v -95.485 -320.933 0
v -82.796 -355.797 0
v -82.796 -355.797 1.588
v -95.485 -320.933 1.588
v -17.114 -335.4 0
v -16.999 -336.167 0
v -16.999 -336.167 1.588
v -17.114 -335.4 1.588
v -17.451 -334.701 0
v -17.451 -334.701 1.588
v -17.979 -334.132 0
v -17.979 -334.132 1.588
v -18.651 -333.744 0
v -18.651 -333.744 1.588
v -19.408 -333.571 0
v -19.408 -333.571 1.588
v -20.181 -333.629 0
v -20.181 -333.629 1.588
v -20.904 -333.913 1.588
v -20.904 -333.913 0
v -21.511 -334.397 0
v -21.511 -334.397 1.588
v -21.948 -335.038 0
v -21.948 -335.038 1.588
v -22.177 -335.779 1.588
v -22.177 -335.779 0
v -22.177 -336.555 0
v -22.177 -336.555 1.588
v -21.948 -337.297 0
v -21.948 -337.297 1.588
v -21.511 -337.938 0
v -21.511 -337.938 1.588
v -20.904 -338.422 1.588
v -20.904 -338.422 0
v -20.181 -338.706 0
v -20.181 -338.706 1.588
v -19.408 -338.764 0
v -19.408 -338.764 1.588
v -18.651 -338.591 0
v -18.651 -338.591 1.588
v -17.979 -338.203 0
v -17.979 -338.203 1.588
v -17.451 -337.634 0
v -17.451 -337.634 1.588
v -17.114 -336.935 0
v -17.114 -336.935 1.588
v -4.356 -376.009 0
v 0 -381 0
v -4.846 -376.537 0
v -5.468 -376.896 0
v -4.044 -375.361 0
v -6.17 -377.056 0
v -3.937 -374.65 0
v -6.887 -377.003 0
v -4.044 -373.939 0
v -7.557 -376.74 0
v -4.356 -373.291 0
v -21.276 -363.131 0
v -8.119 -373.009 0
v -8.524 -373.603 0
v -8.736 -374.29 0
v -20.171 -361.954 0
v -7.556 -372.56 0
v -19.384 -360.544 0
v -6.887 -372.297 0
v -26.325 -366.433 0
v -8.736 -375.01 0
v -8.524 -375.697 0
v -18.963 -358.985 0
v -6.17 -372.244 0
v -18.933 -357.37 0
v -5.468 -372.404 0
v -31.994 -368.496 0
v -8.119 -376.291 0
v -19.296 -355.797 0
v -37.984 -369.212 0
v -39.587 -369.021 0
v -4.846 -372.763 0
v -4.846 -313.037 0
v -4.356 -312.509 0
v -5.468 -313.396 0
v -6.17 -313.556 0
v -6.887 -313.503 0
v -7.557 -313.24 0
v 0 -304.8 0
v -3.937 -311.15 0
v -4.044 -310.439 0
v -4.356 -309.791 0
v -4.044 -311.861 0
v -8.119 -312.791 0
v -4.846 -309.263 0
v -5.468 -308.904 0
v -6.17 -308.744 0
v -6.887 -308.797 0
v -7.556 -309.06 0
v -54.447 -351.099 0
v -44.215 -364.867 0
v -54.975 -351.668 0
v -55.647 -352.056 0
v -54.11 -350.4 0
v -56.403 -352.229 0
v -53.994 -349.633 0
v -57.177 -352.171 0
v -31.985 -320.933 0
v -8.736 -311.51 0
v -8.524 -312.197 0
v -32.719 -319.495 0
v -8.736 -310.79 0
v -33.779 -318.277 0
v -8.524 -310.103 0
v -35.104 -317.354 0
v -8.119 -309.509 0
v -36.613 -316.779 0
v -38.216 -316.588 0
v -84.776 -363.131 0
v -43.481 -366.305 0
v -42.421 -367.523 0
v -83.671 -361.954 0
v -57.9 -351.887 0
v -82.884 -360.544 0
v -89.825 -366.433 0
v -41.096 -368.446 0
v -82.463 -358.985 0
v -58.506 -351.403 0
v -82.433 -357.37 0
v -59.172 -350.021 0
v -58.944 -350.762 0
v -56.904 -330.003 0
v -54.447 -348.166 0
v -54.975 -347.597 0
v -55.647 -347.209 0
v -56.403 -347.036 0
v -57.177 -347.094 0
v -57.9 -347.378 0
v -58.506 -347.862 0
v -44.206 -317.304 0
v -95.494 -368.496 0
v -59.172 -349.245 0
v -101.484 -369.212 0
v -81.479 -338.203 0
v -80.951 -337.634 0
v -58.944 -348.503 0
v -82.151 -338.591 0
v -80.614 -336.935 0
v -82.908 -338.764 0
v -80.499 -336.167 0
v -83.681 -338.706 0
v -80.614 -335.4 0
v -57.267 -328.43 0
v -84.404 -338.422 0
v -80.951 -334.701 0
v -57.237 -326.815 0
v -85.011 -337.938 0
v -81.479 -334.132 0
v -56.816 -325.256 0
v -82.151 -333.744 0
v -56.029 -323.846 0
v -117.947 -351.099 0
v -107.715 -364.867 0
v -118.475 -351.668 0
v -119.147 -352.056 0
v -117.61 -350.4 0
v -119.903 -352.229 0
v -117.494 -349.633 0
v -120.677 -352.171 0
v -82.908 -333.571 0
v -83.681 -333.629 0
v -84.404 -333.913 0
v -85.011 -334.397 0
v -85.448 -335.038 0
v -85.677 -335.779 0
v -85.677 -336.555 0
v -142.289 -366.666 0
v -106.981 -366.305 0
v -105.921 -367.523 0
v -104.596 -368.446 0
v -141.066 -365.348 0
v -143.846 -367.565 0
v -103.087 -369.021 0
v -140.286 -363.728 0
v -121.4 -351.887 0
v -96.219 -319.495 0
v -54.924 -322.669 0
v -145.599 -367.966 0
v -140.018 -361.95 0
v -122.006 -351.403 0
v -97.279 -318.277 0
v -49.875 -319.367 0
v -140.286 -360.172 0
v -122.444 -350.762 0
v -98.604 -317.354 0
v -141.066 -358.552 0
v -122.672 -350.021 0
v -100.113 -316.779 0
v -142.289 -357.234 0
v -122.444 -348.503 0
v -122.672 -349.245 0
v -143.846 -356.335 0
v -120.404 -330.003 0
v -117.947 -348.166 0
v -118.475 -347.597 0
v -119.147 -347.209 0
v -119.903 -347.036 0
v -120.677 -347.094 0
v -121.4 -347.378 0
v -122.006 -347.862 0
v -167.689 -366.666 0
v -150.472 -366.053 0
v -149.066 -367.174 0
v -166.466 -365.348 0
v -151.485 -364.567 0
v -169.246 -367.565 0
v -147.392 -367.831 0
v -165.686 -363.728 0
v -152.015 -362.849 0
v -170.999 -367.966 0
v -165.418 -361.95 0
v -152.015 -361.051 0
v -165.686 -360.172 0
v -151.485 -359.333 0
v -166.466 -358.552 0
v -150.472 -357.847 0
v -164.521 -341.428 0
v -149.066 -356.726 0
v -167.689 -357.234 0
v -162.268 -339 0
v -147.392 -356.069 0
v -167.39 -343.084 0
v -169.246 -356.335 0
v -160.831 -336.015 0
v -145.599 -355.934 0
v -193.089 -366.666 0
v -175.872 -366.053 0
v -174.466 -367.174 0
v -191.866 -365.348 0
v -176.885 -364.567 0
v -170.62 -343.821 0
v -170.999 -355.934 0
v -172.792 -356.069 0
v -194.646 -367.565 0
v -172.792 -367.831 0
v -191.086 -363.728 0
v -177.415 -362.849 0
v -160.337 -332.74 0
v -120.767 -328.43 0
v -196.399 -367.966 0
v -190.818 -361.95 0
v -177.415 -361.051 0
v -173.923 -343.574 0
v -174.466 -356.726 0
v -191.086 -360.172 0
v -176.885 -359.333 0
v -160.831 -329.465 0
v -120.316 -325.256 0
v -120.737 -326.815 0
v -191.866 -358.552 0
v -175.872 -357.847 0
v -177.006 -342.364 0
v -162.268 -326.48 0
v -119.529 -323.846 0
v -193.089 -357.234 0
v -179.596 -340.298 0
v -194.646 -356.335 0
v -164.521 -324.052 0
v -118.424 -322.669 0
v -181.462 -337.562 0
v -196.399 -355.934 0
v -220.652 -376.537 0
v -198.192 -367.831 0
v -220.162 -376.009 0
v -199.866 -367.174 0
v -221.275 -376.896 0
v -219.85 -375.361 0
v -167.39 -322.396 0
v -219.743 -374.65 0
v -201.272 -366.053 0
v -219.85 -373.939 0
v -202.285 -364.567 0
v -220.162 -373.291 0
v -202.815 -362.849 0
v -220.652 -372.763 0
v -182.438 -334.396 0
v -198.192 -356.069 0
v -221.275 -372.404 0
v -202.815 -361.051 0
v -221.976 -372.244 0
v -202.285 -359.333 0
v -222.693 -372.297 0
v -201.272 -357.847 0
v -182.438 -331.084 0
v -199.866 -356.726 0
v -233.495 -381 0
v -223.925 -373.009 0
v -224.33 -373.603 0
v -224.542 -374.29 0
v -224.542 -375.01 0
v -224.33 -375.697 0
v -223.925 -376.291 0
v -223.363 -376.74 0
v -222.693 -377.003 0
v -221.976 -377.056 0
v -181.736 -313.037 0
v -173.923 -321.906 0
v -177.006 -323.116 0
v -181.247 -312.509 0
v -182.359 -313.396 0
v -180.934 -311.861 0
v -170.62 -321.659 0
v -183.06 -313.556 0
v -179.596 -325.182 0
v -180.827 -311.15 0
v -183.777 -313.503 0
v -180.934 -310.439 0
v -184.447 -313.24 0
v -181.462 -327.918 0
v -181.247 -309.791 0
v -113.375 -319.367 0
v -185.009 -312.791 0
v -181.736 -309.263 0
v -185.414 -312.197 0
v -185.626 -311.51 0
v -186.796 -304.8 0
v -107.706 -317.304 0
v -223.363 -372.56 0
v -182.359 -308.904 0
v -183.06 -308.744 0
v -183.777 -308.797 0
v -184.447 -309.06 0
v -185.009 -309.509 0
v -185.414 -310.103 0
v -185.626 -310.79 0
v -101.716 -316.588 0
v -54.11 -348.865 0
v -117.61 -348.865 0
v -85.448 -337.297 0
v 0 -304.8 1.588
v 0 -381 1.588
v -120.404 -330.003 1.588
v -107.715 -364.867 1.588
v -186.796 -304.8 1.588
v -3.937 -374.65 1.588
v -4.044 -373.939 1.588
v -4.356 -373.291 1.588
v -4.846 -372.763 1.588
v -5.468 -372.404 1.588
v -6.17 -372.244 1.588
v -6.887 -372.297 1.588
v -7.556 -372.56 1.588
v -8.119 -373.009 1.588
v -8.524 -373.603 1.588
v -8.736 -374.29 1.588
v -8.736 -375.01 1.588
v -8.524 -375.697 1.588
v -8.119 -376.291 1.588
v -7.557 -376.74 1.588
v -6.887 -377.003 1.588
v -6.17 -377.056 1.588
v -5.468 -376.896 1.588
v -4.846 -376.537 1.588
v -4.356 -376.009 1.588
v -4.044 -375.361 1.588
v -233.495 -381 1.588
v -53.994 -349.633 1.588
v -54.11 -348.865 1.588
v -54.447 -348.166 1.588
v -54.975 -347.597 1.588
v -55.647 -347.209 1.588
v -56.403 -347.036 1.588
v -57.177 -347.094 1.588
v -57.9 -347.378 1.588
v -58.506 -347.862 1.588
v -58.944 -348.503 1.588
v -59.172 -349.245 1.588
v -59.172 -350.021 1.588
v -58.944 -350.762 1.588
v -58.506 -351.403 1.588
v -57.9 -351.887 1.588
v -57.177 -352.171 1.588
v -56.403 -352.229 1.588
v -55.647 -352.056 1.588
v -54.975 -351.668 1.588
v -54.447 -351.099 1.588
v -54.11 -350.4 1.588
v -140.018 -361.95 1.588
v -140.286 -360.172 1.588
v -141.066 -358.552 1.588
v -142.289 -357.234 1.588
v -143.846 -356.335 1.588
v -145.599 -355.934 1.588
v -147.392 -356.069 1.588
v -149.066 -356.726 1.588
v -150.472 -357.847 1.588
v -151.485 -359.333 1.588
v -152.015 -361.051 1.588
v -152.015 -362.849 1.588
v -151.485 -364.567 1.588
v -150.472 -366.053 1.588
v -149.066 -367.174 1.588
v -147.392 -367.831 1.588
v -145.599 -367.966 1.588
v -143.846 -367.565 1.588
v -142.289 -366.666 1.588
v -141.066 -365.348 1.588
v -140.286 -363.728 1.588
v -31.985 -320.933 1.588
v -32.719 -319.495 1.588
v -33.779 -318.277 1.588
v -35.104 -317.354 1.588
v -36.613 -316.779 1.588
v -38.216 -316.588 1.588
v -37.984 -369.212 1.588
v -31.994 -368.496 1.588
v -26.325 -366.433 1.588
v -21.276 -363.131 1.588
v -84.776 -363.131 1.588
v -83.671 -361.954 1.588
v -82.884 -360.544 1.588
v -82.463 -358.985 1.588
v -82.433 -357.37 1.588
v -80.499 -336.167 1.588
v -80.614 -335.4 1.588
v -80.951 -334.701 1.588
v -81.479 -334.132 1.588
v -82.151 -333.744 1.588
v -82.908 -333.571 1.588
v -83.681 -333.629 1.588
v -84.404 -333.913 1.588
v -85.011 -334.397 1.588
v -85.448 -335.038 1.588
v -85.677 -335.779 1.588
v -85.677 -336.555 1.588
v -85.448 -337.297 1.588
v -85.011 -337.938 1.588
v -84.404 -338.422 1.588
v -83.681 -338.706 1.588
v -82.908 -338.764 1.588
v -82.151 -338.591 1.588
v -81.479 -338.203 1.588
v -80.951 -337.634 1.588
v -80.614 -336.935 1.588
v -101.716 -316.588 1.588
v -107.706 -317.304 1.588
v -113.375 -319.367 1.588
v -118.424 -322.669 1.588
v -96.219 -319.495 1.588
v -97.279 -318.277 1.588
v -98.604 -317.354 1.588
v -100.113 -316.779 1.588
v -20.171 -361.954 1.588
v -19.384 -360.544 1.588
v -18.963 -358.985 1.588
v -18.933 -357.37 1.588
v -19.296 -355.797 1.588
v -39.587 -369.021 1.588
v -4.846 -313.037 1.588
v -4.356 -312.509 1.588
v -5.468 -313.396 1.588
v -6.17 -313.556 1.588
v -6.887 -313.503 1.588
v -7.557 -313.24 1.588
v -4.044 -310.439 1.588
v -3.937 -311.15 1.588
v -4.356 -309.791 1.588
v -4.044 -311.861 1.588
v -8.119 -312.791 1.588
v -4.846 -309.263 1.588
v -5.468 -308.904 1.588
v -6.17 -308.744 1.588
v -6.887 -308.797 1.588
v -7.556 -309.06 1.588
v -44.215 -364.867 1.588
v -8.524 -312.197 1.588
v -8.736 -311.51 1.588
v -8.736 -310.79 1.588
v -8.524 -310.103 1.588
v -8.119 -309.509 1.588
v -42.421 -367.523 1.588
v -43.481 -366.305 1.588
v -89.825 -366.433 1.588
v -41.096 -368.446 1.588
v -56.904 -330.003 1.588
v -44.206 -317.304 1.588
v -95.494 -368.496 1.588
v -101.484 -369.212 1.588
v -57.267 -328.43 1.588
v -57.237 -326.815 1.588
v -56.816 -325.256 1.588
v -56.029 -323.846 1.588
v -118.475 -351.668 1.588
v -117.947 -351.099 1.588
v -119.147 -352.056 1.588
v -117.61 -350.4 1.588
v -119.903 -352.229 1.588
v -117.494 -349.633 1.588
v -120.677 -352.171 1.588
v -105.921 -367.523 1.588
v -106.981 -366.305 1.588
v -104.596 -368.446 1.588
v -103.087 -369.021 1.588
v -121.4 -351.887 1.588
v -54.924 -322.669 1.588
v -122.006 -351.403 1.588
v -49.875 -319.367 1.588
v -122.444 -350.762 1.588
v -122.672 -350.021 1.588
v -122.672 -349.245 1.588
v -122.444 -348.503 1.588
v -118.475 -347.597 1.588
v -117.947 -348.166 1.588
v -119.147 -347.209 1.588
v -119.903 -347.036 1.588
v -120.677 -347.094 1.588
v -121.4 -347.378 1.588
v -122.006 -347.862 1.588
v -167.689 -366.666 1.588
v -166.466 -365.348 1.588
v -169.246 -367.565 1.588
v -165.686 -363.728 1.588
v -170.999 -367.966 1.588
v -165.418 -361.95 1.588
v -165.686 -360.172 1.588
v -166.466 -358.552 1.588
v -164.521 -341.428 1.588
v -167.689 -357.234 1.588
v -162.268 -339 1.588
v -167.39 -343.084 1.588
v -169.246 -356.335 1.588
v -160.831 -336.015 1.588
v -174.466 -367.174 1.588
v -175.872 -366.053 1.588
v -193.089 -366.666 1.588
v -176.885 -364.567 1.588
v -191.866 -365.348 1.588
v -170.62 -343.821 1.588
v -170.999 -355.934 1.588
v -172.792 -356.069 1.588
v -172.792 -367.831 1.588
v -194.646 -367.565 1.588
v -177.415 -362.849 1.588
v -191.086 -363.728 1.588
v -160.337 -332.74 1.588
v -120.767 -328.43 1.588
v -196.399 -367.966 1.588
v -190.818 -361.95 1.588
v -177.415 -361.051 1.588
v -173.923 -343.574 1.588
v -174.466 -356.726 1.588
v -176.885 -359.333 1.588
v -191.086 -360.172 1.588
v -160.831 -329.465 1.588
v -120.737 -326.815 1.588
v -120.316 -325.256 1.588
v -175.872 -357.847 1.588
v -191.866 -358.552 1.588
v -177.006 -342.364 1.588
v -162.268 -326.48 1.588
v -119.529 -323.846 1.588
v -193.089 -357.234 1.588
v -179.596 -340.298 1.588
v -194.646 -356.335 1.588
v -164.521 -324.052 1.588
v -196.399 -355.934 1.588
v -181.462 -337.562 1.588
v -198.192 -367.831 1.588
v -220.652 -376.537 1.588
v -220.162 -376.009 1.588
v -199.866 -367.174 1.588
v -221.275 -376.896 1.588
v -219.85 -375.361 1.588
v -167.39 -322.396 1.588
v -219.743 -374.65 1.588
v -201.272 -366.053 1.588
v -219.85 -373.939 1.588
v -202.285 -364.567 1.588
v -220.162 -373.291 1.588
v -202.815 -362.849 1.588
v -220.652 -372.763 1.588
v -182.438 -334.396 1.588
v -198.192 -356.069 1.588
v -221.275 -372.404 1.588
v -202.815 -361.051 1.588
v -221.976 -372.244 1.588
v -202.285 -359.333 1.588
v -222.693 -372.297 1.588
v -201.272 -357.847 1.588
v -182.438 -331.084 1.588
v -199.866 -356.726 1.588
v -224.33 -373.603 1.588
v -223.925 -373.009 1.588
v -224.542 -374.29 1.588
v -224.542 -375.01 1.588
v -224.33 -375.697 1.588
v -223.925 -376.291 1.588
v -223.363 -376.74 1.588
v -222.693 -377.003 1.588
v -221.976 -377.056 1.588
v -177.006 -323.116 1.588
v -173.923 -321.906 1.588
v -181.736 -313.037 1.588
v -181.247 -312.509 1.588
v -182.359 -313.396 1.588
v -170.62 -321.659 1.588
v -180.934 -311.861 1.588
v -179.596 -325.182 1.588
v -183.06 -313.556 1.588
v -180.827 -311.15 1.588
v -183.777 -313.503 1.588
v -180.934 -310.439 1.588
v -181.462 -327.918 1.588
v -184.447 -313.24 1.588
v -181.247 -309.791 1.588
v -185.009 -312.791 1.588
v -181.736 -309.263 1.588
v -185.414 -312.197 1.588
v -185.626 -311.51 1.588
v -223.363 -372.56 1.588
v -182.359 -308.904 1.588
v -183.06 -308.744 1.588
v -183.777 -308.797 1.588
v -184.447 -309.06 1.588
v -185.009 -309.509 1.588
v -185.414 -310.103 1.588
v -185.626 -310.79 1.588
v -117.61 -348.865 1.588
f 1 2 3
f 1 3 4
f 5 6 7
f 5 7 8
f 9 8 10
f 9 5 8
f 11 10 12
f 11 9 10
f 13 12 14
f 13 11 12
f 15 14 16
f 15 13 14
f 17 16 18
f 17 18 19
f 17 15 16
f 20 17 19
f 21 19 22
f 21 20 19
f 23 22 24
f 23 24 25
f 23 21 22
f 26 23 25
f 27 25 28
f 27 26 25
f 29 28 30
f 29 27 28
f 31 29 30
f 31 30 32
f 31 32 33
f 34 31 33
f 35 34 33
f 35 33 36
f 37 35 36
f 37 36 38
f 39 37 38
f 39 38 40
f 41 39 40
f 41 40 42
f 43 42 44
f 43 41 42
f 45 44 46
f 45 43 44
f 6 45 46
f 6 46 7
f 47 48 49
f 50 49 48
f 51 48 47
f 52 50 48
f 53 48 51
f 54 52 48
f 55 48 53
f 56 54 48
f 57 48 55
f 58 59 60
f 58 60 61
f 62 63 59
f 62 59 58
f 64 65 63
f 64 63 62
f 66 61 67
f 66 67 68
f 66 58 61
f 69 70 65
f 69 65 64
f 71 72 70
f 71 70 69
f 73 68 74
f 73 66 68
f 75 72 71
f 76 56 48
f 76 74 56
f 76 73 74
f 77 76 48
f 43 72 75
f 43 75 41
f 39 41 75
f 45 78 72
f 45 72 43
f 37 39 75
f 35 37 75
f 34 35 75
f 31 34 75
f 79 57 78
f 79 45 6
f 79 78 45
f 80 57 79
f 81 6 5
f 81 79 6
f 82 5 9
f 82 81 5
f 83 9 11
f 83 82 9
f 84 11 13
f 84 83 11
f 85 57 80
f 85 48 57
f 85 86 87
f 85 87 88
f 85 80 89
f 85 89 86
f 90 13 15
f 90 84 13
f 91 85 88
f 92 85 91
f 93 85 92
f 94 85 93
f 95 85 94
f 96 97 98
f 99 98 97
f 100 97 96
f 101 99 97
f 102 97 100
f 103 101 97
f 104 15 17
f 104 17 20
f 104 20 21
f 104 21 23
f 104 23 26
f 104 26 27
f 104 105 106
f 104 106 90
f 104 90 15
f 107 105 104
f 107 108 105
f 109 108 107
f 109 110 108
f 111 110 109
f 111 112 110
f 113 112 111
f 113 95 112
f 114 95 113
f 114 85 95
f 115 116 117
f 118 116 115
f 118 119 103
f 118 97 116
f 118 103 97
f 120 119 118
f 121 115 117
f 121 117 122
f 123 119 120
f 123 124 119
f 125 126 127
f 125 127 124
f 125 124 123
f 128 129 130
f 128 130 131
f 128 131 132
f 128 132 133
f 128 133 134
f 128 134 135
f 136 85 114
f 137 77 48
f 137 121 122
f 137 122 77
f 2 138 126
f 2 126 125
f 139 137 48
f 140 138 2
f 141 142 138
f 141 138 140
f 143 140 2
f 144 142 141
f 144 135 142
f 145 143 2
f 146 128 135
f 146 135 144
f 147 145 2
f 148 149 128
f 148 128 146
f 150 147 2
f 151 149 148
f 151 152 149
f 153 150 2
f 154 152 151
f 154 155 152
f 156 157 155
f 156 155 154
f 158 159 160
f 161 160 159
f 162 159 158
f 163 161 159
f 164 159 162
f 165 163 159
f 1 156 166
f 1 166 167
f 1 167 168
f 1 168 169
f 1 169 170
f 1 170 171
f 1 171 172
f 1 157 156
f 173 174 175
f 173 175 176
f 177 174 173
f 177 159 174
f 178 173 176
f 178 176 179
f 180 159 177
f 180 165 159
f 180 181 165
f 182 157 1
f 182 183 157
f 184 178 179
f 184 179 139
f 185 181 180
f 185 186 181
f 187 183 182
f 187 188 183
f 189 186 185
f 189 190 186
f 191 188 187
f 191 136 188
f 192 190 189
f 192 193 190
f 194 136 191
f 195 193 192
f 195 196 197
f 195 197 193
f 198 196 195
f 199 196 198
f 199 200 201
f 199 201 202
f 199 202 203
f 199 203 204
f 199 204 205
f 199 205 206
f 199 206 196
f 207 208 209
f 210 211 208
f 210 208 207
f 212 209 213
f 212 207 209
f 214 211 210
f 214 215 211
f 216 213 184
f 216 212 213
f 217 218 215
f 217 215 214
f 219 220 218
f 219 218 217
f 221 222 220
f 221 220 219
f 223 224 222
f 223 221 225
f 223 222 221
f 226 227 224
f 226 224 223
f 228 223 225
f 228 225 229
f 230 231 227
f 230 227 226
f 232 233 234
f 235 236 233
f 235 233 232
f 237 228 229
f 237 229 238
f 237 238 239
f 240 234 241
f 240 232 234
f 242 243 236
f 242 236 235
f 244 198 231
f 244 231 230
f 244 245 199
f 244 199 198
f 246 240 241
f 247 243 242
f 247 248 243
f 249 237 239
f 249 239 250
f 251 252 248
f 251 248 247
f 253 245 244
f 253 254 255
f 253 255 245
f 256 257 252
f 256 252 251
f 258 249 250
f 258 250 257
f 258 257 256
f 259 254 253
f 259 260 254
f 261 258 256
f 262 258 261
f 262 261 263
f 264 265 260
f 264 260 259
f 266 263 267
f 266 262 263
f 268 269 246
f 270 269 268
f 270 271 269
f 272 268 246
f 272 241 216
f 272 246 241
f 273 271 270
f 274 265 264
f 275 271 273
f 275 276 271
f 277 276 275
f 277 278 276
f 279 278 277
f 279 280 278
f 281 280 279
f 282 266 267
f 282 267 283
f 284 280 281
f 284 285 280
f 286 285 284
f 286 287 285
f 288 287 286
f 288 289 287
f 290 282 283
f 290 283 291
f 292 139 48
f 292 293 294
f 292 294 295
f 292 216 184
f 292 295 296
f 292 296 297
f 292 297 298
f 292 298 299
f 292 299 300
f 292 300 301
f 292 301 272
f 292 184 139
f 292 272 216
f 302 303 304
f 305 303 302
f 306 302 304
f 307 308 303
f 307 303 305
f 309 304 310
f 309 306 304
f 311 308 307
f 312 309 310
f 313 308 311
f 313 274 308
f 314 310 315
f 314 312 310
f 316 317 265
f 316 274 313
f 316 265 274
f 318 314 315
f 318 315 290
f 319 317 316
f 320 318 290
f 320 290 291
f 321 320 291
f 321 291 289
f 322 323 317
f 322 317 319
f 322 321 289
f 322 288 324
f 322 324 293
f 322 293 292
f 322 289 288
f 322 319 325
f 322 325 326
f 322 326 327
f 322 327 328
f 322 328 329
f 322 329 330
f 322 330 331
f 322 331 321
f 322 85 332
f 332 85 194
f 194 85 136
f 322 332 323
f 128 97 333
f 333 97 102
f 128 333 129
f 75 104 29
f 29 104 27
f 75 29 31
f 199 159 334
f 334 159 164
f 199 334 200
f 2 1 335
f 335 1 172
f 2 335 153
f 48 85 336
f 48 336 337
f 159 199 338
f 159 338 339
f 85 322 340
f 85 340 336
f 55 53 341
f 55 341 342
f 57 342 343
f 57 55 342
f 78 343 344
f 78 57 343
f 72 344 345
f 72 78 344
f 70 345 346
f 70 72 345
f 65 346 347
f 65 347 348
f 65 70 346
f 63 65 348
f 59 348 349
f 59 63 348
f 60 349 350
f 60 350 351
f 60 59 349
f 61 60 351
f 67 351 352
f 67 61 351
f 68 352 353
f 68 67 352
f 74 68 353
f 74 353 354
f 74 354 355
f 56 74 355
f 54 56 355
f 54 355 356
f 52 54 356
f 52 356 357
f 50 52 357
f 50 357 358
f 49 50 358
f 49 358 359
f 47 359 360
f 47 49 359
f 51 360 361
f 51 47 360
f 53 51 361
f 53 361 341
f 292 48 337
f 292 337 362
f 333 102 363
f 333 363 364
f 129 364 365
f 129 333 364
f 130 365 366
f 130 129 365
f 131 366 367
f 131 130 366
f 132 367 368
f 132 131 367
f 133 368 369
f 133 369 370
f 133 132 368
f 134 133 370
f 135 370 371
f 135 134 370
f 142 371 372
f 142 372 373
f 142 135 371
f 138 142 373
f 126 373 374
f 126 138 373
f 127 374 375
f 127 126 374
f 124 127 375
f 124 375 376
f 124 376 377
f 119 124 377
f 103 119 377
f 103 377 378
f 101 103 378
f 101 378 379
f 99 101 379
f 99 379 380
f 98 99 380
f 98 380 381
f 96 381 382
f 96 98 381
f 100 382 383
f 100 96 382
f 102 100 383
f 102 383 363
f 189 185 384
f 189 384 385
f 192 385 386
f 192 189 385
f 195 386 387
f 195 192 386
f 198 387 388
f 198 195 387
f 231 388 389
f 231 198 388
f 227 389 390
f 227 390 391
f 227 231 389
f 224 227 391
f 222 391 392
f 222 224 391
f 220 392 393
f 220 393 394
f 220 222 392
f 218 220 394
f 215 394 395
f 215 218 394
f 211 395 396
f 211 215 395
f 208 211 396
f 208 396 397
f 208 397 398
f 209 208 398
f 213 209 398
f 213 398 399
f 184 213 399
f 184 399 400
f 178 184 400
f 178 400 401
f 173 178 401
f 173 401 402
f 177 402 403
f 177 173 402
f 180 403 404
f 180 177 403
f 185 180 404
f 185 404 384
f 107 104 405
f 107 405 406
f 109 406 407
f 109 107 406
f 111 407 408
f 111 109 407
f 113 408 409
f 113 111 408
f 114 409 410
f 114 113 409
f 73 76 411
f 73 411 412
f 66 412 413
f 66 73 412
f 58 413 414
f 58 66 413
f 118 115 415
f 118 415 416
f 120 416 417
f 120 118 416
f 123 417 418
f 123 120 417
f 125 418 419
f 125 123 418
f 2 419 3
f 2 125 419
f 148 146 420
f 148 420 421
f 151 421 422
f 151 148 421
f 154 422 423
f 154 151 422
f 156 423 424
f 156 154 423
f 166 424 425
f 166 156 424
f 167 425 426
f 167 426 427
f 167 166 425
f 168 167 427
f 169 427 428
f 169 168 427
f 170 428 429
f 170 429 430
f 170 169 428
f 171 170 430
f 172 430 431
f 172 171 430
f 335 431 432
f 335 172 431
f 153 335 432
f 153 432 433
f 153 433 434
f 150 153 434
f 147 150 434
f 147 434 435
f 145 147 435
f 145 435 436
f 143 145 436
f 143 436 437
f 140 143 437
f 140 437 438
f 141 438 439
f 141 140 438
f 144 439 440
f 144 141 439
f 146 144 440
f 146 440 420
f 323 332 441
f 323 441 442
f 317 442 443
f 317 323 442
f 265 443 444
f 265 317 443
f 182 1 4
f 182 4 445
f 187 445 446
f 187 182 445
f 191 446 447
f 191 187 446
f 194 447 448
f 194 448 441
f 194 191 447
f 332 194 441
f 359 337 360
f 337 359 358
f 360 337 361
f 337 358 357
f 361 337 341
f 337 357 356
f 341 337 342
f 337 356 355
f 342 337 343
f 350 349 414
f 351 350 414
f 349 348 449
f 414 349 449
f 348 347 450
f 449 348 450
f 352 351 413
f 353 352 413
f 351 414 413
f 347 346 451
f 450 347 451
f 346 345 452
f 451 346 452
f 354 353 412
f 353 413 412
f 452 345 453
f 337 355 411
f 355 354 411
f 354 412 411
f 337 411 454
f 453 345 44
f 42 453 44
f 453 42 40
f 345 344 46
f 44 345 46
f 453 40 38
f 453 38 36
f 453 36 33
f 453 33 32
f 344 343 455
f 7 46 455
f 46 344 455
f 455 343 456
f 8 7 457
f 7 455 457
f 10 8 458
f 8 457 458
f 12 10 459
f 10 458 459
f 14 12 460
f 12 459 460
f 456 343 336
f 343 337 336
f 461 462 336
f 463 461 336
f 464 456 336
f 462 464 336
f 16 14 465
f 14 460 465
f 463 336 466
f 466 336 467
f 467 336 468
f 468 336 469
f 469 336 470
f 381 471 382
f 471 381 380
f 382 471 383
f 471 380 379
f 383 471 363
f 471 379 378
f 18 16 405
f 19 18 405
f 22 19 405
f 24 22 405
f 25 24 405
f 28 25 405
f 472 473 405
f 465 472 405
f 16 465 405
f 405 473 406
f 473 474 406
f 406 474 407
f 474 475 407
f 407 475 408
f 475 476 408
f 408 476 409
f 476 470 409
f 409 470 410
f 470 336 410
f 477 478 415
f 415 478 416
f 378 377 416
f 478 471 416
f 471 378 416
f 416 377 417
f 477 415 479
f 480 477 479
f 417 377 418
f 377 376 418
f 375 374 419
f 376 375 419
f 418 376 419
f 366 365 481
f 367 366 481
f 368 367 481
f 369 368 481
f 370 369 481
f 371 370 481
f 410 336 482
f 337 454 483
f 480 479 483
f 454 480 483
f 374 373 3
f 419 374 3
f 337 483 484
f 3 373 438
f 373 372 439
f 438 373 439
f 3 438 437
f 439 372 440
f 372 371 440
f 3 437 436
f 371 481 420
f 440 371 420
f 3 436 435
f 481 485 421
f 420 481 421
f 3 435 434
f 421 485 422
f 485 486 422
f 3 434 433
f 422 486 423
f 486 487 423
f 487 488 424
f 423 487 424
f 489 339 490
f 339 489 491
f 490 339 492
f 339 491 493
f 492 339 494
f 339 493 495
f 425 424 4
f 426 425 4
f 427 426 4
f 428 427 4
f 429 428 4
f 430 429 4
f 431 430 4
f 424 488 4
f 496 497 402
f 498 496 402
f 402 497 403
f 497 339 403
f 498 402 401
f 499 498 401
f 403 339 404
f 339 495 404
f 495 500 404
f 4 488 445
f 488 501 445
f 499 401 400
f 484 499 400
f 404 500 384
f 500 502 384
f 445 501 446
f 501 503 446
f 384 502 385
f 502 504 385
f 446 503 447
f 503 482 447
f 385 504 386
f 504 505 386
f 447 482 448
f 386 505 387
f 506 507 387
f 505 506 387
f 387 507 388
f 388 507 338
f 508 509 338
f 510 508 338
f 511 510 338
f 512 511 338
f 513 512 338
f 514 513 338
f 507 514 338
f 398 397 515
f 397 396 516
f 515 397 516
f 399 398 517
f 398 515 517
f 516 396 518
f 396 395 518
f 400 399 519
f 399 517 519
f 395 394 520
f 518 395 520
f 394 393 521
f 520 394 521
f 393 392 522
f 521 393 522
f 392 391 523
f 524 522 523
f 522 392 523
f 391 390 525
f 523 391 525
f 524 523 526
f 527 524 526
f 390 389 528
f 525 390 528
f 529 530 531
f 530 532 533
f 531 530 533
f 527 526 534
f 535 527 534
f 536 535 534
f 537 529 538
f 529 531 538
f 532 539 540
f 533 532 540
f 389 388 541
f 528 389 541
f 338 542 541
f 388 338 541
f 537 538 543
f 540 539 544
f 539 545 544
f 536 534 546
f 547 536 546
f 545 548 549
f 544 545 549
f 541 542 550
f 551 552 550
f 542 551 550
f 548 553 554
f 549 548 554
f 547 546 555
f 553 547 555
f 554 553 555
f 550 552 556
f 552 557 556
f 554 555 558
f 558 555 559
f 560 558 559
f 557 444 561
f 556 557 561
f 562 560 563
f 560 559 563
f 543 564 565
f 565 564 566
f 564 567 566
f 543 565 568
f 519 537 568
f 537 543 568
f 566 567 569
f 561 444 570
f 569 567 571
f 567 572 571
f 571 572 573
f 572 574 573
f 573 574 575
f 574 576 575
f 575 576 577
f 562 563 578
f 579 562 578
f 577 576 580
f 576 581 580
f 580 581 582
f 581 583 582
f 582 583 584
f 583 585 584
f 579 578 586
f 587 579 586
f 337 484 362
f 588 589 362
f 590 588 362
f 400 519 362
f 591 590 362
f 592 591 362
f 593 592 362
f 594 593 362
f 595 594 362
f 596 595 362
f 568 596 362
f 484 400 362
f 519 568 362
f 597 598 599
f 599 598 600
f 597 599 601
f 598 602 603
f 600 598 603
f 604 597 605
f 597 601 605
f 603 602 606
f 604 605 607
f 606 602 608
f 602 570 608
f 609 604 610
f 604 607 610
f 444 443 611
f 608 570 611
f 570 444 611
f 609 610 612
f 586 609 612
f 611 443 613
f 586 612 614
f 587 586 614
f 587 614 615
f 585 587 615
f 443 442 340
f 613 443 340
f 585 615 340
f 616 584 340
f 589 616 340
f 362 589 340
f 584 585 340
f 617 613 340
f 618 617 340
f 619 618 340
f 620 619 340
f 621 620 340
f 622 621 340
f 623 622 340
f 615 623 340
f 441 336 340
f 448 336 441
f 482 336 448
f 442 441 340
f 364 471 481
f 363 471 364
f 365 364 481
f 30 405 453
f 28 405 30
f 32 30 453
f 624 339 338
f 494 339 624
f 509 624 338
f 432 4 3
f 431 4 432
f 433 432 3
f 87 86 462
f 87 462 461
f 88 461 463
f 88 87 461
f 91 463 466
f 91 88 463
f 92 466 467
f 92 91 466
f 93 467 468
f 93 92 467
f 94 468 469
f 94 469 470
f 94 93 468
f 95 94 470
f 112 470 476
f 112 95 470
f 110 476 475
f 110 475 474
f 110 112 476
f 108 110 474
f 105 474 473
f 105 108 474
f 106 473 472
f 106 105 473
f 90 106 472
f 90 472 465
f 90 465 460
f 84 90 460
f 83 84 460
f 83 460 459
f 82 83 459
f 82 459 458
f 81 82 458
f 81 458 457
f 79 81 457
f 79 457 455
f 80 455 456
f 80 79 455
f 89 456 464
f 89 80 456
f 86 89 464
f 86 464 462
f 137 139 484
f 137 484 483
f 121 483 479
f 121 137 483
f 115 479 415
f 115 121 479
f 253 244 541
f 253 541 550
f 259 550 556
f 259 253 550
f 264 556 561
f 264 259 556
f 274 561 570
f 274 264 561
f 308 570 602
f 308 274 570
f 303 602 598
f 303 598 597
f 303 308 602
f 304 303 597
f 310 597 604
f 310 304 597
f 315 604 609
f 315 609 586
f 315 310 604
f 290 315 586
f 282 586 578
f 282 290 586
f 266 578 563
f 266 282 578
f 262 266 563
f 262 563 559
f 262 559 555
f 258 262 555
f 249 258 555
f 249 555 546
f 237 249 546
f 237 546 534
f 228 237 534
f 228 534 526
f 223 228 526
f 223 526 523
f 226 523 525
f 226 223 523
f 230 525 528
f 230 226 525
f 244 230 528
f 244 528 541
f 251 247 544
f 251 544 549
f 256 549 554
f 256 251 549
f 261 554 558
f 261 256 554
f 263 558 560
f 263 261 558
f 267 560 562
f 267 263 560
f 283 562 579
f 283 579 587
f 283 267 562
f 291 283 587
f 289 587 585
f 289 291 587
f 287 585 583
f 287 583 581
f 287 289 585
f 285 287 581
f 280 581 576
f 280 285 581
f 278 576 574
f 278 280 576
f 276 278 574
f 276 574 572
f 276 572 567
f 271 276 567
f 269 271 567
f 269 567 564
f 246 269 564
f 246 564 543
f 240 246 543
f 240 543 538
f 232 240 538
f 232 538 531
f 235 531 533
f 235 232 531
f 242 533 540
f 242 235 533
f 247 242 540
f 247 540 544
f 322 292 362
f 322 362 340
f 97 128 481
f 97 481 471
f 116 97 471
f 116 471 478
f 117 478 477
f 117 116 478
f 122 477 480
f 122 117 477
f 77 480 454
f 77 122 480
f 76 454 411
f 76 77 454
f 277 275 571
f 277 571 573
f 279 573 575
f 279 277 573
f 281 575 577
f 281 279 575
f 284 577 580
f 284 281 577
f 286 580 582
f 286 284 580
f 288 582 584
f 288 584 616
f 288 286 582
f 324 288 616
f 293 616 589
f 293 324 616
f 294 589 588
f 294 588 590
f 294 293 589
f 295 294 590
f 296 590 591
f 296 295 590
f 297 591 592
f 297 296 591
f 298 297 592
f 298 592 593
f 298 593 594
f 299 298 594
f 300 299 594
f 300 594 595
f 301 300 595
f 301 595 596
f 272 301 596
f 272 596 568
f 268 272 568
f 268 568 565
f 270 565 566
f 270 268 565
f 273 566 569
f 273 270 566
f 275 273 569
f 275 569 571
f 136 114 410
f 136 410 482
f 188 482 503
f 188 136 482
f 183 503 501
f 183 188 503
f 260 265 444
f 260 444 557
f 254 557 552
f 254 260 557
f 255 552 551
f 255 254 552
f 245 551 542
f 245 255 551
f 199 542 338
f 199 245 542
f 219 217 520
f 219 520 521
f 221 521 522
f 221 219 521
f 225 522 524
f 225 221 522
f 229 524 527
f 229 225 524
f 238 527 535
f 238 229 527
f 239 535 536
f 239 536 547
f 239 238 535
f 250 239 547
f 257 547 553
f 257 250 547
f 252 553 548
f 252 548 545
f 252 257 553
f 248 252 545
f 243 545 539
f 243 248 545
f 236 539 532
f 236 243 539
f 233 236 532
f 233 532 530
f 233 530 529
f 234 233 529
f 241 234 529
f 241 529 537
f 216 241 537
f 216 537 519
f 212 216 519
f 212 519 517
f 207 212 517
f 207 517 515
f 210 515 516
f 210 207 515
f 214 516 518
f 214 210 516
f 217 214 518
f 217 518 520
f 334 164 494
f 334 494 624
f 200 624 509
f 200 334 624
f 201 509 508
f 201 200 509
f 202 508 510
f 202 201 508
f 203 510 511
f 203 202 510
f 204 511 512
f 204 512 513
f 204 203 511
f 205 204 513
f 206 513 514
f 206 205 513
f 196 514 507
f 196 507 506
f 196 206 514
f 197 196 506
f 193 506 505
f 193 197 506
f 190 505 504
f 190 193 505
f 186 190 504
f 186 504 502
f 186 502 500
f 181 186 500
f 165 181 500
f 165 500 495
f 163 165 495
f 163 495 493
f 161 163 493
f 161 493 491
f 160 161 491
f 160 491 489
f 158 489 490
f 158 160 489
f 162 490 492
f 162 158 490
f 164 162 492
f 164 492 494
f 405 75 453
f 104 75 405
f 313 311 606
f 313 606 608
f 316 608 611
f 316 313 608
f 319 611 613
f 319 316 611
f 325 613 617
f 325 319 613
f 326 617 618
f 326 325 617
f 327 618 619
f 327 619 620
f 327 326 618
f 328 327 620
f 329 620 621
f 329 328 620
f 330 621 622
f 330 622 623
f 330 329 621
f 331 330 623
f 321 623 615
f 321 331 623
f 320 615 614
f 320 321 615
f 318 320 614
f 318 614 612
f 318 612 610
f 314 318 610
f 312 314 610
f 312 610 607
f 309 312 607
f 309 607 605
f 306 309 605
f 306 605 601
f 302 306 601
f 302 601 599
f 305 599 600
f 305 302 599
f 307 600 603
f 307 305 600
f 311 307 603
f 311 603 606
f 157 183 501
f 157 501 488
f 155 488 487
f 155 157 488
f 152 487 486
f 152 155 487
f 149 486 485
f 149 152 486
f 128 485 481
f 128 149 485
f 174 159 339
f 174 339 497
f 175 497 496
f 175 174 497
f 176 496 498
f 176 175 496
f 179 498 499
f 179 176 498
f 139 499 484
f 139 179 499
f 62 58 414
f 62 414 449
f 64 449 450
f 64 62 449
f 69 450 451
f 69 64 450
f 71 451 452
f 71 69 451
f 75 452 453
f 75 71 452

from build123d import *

# Parameters (mm, degrees)
SKETCH1_R   = 11.1125
SKETCH1_R_2 = 6.0325
SKETCH1_R_3 = 2.413
SKETCH1_R_4 = 2.6035
PANEL_DEPTH = 1.5875


with BuildPart() as part:
    # Sketch1 → Panel (new body)
    with BuildSketch(Plane.XY):
        Polygon((-233.495394339, -381), (-186.796315472, -304.8), (0, -304.8), (0, -381), align=None)
        with Locations((-171.45, -332.74)):
            Circle(SKETCH1_R, mode=Mode.SUBTRACT)
        with Locations((-196.85, -361.95)):
            Circle(SKETCH1_R_2, mode=Mode.SUBTRACT)
        with Locations((-171.45, -361.95)):
            Circle(SKETCH1_R_2, mode=Mode.SUBTRACT)
        with Locations((-146.05, -361.95)):
            Circle(SKETCH1_R_2, mode=Mode.SUBTRACT)
        with Locations((-6.35, -311.15)):
            Circle(SKETCH1_R_3, mode=Mode.SUBTRACT)
        with Locations((-6.35, -374.65)):
            Circle(SKETCH1_R_3, mode=Mode.SUBTRACT)
        with Locations((-222.156189245, -374.65)):
            Circle(SKETCH1_R_3, mode=Mode.SUBTRACT)
        with Locations((-183.240290189, -311.15)):
            Circle(SKETCH1_R_3, mode=Mode.SUBTRACT)
        with Locations((-19.60215076, -336.167333479)):
            Circle(SKETCH1_R_4, mode=Mode.SUBTRACT)
        with Locations((-56.59784924, -349.632666521)):
            Circle(SKETCH1_R_4, mode=Mode.SUBTRACT)
        with Locations((-83.10215076, -336.167333479)):
            Circle(SKETCH1_R_4, mode=Mode.SUBTRACT)
        with Locations((-120.09784924, -349.632666521)):
            Circle(SKETCH1_R_4, mode=Mode.SUBTRACT)
        with BuildLine():
            Line((-56.904231841, -330.003007558), (-44.214850365, -364.866796631))
            ThreePointArc((-44.214850365, -364.866796631), (-41.786616314, -368.025044915), (-37.983738549, -369.212046828))
            ThreePointArc((-37.983738549, -369.212046828), (-29.099761225, -367.627952805), (-21.276003752, -363.13092868))
            ThreePointArc((-21.276003752, -363.13092868), (-19.125820494, -359.777189752), (-19.295768159, -355.796992442))
            Line((-19.295768159, -355.796992442), (-31.985149635, -320.933203369))
            ThreePointArc((-31.985149635, -320.933203369), (-34.413383686, -317.774955085), (-38.216261451, -316.587953172))
            ThreePointArc((-38.216261451, -316.587953172), (-47.100238775, -318.172047195), (-54.923996248, -322.66907132))
            ThreePointArc((-54.923996248, -322.66907132), (-57.074179506, -326.022810248), (-56.904231841, -330.003007558))
        make_face(mode=Mode.SUBTRACT)
        with BuildLine():
            Line((-120.404231841, -330.003007558), (-107.714850365, -364.866796631))
            ThreePointArc((-107.714850365, -364.866796631), (-105.286616314, -368.025044915), (-101.483738549, -369.212046828))
            ThreePointArc((-101.483738549, -369.212046828), (-92.599761225, -367.627952805), (-84.776003752, -363.13092868))
            ThreePointArc((-84.776003752, -363.13092868), (-82.625820494, -359.777189752), (-82.795768159, -355.796992442))
            Line((-82.795768159, -355.796992442), (-95.485149635, -320.933203369))
            ThreePointArc((-95.485149635, -320.933203369), (-97.913383686, -317.774955085), (-101.716261451, -316.587953172))
            ThreePointArc((-101.716261451, -316.587953172), (-110.600238775, -318.172047195), (-118.423996248, -322.66907132))
            ThreePointArc((-118.423996248, -322.66907132), (-120.574179506, -326.022810248), (-120.404231841, -330.003007558))
        make_face(mode=Mode.SUBTRACT)
    extrude(amount=PANEL_DEPTH)


solid = part.part
